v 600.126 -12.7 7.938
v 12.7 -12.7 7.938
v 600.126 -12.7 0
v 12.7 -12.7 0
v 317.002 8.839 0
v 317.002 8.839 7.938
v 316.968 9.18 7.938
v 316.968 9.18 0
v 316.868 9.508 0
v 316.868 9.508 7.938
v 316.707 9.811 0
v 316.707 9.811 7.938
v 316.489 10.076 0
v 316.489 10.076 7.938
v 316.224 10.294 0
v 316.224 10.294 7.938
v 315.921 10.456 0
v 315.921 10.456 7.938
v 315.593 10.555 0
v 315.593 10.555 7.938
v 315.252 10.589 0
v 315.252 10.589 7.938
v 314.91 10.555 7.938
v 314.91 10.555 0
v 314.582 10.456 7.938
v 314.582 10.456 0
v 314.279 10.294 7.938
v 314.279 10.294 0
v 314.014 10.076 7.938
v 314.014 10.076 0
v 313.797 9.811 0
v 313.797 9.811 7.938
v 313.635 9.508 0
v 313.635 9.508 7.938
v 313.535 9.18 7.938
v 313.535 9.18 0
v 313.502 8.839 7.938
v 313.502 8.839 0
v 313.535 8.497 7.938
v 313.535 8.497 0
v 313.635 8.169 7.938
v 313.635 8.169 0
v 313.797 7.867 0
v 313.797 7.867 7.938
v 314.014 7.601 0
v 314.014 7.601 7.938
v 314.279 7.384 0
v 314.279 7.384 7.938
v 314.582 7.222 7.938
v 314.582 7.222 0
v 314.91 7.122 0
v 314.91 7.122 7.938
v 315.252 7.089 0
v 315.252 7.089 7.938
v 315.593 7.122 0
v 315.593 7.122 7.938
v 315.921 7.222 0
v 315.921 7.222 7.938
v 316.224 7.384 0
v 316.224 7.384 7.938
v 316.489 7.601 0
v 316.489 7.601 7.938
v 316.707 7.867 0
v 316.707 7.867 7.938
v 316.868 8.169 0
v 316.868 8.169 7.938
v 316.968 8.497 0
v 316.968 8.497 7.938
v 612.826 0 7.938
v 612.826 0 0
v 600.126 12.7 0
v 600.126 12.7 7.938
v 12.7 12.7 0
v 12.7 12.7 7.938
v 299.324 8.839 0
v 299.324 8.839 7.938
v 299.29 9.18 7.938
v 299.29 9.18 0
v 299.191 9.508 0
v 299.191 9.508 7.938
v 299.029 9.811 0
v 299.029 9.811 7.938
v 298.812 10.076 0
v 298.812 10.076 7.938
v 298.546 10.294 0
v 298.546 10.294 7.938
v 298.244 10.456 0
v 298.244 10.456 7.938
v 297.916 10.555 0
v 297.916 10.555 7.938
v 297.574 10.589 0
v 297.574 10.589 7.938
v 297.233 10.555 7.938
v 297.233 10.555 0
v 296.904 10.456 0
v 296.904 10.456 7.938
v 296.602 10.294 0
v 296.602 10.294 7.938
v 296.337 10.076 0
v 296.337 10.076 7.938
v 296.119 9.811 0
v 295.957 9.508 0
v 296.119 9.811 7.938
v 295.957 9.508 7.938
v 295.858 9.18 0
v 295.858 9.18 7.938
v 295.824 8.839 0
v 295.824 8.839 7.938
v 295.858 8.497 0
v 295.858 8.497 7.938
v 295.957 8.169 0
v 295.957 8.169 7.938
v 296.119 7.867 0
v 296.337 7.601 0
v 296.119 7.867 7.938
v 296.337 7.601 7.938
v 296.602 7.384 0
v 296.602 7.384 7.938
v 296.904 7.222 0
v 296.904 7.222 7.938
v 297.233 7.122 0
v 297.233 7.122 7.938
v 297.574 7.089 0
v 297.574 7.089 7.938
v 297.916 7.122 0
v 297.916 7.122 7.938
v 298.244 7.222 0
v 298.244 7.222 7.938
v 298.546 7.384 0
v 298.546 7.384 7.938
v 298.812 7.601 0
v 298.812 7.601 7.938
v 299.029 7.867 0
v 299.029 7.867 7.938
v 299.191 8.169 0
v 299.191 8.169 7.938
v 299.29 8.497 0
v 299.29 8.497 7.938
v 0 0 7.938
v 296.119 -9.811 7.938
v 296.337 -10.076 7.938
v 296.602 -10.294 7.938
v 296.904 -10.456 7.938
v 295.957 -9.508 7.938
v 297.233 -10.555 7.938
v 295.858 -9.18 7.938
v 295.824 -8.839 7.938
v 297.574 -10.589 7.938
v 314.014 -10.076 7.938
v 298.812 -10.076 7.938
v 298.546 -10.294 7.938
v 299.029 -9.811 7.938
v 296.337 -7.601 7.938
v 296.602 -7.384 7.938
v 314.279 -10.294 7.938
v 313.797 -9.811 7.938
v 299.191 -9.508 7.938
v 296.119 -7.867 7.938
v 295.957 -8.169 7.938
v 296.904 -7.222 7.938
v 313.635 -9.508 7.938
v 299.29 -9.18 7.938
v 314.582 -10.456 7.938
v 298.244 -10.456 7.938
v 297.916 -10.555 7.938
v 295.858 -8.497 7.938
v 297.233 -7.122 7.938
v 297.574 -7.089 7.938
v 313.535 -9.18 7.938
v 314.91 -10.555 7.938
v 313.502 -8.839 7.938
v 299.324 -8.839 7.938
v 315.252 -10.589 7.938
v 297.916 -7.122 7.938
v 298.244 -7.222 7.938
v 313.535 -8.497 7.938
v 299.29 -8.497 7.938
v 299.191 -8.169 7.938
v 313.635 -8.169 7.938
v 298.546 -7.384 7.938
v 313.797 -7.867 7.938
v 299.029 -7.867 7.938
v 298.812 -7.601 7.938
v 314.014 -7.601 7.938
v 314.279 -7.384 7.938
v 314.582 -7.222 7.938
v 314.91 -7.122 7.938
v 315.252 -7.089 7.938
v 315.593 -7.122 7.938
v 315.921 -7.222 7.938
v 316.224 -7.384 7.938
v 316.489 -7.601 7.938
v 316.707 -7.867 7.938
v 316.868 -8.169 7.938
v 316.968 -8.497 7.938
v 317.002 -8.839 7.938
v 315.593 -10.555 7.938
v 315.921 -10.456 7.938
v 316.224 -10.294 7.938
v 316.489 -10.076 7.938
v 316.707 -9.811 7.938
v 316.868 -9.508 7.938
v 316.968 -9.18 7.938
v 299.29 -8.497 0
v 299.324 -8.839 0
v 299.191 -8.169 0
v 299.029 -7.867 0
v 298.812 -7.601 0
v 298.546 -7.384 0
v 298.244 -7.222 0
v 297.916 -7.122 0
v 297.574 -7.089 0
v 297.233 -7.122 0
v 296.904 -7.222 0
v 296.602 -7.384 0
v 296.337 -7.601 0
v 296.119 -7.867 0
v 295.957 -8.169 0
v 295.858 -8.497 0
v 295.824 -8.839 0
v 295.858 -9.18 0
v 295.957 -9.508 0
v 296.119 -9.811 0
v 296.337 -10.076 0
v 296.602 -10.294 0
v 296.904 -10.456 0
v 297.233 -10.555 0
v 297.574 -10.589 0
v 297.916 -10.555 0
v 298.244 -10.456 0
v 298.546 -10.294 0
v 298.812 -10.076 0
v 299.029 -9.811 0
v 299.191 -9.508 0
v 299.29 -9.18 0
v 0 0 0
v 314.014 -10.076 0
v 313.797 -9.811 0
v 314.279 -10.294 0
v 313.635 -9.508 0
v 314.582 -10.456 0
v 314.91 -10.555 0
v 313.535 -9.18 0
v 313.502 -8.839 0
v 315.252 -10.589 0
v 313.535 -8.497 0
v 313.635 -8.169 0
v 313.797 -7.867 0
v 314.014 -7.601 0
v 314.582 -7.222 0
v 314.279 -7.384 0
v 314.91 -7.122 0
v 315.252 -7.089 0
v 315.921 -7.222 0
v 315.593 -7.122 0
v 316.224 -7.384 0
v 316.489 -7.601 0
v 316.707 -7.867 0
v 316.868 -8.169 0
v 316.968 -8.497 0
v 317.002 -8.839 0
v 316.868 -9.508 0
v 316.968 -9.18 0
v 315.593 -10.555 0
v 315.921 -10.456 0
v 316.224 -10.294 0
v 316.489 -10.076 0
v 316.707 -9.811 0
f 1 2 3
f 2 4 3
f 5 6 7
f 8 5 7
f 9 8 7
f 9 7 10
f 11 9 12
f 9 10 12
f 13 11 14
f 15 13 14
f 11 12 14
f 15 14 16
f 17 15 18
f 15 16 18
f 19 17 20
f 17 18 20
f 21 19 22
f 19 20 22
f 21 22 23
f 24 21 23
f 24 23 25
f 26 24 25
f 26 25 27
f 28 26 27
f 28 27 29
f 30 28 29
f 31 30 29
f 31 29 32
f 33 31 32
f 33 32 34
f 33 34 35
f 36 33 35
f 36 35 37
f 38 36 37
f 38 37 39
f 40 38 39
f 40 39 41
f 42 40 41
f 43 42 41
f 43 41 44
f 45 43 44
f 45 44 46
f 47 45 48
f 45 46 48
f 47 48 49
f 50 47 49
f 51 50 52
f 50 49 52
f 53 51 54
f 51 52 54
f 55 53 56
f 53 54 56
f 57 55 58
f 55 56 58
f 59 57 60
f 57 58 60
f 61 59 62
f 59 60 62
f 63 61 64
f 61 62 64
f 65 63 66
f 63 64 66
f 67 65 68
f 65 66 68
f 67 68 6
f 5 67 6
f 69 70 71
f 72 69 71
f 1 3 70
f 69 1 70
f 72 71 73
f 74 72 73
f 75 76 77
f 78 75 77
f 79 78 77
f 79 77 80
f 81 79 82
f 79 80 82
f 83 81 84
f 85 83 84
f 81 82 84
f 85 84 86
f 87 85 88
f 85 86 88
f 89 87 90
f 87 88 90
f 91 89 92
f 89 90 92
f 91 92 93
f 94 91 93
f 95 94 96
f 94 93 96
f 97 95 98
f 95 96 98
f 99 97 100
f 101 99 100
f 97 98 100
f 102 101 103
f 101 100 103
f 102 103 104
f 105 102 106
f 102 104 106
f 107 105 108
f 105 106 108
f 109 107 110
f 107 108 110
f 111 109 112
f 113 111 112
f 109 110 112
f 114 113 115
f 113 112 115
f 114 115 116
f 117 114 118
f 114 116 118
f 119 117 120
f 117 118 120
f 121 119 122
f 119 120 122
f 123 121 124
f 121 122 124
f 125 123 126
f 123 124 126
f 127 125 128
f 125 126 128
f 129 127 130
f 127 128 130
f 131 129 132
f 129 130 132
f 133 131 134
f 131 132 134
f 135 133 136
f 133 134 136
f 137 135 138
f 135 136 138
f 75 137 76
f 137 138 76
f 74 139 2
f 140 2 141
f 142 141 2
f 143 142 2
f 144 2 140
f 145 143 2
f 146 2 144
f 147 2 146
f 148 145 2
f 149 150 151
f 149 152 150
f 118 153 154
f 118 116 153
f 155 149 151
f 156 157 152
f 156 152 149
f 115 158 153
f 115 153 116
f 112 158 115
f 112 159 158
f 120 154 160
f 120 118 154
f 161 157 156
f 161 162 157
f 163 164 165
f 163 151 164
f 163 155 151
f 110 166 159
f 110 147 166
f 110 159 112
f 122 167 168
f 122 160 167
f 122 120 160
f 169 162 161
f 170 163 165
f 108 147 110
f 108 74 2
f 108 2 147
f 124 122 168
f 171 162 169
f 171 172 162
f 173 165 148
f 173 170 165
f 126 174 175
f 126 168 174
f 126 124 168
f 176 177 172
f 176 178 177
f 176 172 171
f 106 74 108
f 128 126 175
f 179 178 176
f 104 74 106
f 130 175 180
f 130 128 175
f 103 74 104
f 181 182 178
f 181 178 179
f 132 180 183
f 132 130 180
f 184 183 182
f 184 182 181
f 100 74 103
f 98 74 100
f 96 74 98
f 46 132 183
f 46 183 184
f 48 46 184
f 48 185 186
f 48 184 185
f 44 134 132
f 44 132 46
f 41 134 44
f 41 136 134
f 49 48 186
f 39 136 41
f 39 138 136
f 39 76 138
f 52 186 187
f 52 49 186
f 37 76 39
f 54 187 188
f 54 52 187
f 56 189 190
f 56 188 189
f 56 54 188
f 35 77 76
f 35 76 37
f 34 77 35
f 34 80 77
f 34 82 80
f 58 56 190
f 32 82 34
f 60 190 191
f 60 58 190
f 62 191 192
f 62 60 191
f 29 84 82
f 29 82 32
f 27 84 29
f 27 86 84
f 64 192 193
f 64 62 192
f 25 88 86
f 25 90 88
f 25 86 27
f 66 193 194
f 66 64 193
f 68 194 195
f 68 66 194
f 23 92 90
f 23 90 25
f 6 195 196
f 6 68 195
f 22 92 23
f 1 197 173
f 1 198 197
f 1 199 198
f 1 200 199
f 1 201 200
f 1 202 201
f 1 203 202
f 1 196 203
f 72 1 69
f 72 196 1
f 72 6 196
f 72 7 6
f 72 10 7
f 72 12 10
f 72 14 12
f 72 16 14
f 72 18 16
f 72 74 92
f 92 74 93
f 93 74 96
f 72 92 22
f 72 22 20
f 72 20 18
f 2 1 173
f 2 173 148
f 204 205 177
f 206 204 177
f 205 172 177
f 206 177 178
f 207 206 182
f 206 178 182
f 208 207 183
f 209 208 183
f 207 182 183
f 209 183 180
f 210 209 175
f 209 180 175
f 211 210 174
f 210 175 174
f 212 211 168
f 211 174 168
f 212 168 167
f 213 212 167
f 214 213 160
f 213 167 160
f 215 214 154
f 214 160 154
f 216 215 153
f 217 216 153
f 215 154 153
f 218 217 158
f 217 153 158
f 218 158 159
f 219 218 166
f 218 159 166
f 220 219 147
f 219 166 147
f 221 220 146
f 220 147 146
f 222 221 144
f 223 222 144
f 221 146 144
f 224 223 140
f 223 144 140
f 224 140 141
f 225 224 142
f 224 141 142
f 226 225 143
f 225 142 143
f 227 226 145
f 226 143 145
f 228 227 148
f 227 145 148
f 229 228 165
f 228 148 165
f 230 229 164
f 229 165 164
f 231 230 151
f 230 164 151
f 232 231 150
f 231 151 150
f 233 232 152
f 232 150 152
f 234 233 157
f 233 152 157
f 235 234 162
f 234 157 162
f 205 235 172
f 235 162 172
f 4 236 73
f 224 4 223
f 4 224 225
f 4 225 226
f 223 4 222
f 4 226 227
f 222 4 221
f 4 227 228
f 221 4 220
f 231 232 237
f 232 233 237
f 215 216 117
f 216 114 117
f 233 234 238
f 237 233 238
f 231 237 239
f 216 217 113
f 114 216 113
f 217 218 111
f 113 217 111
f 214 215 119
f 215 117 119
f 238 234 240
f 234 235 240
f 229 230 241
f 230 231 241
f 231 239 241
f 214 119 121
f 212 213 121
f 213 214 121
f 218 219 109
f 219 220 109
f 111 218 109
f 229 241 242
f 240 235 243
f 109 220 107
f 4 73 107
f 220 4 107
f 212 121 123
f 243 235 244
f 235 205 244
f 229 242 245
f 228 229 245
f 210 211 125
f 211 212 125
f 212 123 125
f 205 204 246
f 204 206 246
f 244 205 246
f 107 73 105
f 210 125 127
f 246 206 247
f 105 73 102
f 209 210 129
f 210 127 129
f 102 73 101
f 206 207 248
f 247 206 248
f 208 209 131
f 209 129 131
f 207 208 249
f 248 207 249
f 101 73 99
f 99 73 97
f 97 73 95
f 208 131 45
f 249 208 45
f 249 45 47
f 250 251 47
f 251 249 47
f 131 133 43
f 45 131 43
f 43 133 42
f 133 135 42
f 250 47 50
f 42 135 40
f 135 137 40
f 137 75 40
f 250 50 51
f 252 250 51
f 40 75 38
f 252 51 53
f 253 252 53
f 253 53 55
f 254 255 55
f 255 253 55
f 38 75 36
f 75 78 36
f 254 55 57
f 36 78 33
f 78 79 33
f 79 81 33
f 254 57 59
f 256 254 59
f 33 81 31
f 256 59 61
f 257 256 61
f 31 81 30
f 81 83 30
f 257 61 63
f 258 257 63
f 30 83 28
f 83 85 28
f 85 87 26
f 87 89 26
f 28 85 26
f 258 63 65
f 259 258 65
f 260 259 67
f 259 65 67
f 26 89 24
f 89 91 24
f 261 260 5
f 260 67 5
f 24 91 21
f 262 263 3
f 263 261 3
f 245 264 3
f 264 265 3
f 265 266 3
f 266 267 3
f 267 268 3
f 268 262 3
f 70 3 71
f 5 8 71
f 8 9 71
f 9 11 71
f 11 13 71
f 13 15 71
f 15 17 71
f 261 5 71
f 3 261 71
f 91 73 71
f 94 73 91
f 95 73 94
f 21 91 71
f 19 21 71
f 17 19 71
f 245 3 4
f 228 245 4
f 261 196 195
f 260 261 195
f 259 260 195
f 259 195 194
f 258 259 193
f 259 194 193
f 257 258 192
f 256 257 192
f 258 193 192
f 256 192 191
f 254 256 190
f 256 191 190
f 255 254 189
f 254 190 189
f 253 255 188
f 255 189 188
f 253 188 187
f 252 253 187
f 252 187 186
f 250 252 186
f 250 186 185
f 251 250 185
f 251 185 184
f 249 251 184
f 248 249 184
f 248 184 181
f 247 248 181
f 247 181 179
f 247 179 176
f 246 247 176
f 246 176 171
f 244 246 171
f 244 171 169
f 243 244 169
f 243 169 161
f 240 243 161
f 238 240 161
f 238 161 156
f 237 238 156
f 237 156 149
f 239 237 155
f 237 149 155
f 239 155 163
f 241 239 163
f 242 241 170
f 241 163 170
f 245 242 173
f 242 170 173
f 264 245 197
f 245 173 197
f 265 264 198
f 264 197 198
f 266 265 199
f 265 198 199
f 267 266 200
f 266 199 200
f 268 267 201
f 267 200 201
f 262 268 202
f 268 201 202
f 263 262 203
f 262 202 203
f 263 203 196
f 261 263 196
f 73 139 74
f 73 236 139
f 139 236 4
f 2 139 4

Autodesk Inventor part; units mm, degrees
ref_plane "YZ Plane" through (0, 0, 0) normal (1, 0, 0) x (0, 1, 0)
ref_plane "XZ Plane" through (0, 0, 0) normal (0, 1, 0) x (-1, 0, 0)
ref_plane "XY Plane" through (0, 0, 0) normal (0, 0, 1) x (1, 0, 0)
sketch "Sketch1" plane through (0, 0, 0) normal (0, 0, 1) x (1, 0, 0)
  line L0 (0, 0) -> (12.7, 12.7)
  line L1 (0, 0) -> (12.7, -12.7)
  line L2 (12.7, -12.7) -> (600.1258, -12.7)
  line L3 (600.1258, -12.7) -> (612.8258, 0)
  line L4 (612.8258, 0) -> (600.1258, 12.7)
  line L5 (600.1258, 12.7) -> (12.7, 12.7)
  line L6 (0, 0) -> (26.9875, 0) construction
  dimension "d0" = 90
  dimension "d1" = 45
  dimension "d2" = 612.8258
  dimension "d3" = 25.4
  dimension "d4" = 12.7
  dimension "d5" = 0
extrude "Extrusion1" add sketch "Sketch1" along normal blind 7.9375
sketch "Sketch2" plane through (0, 0, 7.9375) normal (0, 0, 1) x (1, 0, 0)
  line L0 (12.7, 12.7) -> (0, 0) construction
  line L1 (0, 0) -> (306.4129, 0) construction
  line L2 (600.1258, 12.7) -> (12.7, 12.7) construction
  line L3 (306.4129, 0) -> (306.4129, 138.1125) construction
  circle A0 centre (306.4129, 0) radius 12.5 construction
  line L4 (297.5741, 8.8388) -> (315.2517, 8.8388) construction
  line L5 (315.2517, 8.8388) -> (315.2517, -8.8388) construction
  line L6 (315.2517, -8.8388) -> (297.5741, -8.8388) construction
  line L7 (297.5741, -8.8388) -> (297.5741, 8.8388) construction
  circle A1 centre (297.5741, 8.8388) radius 1.75
  circle A2 centre (315.2517, 8.8388) radius 1.75
  circle A3 centre (315.2517, -8.8388) radius 1.75
  circle A4 centre (297.5741, -8.8388) radius 1.75
  dimension "d8" = 306.4129
  dimension "d9" = 25
  dimension "d10" = 3.5
  dimension "d11" = 3.5
  dimension "d12" = 3.5
  dimension "d13" = 3.5
extrude "Extrusion2" cut sketch "Sketch2" against normal through all
properties part number "Motor Strap 5-16"
